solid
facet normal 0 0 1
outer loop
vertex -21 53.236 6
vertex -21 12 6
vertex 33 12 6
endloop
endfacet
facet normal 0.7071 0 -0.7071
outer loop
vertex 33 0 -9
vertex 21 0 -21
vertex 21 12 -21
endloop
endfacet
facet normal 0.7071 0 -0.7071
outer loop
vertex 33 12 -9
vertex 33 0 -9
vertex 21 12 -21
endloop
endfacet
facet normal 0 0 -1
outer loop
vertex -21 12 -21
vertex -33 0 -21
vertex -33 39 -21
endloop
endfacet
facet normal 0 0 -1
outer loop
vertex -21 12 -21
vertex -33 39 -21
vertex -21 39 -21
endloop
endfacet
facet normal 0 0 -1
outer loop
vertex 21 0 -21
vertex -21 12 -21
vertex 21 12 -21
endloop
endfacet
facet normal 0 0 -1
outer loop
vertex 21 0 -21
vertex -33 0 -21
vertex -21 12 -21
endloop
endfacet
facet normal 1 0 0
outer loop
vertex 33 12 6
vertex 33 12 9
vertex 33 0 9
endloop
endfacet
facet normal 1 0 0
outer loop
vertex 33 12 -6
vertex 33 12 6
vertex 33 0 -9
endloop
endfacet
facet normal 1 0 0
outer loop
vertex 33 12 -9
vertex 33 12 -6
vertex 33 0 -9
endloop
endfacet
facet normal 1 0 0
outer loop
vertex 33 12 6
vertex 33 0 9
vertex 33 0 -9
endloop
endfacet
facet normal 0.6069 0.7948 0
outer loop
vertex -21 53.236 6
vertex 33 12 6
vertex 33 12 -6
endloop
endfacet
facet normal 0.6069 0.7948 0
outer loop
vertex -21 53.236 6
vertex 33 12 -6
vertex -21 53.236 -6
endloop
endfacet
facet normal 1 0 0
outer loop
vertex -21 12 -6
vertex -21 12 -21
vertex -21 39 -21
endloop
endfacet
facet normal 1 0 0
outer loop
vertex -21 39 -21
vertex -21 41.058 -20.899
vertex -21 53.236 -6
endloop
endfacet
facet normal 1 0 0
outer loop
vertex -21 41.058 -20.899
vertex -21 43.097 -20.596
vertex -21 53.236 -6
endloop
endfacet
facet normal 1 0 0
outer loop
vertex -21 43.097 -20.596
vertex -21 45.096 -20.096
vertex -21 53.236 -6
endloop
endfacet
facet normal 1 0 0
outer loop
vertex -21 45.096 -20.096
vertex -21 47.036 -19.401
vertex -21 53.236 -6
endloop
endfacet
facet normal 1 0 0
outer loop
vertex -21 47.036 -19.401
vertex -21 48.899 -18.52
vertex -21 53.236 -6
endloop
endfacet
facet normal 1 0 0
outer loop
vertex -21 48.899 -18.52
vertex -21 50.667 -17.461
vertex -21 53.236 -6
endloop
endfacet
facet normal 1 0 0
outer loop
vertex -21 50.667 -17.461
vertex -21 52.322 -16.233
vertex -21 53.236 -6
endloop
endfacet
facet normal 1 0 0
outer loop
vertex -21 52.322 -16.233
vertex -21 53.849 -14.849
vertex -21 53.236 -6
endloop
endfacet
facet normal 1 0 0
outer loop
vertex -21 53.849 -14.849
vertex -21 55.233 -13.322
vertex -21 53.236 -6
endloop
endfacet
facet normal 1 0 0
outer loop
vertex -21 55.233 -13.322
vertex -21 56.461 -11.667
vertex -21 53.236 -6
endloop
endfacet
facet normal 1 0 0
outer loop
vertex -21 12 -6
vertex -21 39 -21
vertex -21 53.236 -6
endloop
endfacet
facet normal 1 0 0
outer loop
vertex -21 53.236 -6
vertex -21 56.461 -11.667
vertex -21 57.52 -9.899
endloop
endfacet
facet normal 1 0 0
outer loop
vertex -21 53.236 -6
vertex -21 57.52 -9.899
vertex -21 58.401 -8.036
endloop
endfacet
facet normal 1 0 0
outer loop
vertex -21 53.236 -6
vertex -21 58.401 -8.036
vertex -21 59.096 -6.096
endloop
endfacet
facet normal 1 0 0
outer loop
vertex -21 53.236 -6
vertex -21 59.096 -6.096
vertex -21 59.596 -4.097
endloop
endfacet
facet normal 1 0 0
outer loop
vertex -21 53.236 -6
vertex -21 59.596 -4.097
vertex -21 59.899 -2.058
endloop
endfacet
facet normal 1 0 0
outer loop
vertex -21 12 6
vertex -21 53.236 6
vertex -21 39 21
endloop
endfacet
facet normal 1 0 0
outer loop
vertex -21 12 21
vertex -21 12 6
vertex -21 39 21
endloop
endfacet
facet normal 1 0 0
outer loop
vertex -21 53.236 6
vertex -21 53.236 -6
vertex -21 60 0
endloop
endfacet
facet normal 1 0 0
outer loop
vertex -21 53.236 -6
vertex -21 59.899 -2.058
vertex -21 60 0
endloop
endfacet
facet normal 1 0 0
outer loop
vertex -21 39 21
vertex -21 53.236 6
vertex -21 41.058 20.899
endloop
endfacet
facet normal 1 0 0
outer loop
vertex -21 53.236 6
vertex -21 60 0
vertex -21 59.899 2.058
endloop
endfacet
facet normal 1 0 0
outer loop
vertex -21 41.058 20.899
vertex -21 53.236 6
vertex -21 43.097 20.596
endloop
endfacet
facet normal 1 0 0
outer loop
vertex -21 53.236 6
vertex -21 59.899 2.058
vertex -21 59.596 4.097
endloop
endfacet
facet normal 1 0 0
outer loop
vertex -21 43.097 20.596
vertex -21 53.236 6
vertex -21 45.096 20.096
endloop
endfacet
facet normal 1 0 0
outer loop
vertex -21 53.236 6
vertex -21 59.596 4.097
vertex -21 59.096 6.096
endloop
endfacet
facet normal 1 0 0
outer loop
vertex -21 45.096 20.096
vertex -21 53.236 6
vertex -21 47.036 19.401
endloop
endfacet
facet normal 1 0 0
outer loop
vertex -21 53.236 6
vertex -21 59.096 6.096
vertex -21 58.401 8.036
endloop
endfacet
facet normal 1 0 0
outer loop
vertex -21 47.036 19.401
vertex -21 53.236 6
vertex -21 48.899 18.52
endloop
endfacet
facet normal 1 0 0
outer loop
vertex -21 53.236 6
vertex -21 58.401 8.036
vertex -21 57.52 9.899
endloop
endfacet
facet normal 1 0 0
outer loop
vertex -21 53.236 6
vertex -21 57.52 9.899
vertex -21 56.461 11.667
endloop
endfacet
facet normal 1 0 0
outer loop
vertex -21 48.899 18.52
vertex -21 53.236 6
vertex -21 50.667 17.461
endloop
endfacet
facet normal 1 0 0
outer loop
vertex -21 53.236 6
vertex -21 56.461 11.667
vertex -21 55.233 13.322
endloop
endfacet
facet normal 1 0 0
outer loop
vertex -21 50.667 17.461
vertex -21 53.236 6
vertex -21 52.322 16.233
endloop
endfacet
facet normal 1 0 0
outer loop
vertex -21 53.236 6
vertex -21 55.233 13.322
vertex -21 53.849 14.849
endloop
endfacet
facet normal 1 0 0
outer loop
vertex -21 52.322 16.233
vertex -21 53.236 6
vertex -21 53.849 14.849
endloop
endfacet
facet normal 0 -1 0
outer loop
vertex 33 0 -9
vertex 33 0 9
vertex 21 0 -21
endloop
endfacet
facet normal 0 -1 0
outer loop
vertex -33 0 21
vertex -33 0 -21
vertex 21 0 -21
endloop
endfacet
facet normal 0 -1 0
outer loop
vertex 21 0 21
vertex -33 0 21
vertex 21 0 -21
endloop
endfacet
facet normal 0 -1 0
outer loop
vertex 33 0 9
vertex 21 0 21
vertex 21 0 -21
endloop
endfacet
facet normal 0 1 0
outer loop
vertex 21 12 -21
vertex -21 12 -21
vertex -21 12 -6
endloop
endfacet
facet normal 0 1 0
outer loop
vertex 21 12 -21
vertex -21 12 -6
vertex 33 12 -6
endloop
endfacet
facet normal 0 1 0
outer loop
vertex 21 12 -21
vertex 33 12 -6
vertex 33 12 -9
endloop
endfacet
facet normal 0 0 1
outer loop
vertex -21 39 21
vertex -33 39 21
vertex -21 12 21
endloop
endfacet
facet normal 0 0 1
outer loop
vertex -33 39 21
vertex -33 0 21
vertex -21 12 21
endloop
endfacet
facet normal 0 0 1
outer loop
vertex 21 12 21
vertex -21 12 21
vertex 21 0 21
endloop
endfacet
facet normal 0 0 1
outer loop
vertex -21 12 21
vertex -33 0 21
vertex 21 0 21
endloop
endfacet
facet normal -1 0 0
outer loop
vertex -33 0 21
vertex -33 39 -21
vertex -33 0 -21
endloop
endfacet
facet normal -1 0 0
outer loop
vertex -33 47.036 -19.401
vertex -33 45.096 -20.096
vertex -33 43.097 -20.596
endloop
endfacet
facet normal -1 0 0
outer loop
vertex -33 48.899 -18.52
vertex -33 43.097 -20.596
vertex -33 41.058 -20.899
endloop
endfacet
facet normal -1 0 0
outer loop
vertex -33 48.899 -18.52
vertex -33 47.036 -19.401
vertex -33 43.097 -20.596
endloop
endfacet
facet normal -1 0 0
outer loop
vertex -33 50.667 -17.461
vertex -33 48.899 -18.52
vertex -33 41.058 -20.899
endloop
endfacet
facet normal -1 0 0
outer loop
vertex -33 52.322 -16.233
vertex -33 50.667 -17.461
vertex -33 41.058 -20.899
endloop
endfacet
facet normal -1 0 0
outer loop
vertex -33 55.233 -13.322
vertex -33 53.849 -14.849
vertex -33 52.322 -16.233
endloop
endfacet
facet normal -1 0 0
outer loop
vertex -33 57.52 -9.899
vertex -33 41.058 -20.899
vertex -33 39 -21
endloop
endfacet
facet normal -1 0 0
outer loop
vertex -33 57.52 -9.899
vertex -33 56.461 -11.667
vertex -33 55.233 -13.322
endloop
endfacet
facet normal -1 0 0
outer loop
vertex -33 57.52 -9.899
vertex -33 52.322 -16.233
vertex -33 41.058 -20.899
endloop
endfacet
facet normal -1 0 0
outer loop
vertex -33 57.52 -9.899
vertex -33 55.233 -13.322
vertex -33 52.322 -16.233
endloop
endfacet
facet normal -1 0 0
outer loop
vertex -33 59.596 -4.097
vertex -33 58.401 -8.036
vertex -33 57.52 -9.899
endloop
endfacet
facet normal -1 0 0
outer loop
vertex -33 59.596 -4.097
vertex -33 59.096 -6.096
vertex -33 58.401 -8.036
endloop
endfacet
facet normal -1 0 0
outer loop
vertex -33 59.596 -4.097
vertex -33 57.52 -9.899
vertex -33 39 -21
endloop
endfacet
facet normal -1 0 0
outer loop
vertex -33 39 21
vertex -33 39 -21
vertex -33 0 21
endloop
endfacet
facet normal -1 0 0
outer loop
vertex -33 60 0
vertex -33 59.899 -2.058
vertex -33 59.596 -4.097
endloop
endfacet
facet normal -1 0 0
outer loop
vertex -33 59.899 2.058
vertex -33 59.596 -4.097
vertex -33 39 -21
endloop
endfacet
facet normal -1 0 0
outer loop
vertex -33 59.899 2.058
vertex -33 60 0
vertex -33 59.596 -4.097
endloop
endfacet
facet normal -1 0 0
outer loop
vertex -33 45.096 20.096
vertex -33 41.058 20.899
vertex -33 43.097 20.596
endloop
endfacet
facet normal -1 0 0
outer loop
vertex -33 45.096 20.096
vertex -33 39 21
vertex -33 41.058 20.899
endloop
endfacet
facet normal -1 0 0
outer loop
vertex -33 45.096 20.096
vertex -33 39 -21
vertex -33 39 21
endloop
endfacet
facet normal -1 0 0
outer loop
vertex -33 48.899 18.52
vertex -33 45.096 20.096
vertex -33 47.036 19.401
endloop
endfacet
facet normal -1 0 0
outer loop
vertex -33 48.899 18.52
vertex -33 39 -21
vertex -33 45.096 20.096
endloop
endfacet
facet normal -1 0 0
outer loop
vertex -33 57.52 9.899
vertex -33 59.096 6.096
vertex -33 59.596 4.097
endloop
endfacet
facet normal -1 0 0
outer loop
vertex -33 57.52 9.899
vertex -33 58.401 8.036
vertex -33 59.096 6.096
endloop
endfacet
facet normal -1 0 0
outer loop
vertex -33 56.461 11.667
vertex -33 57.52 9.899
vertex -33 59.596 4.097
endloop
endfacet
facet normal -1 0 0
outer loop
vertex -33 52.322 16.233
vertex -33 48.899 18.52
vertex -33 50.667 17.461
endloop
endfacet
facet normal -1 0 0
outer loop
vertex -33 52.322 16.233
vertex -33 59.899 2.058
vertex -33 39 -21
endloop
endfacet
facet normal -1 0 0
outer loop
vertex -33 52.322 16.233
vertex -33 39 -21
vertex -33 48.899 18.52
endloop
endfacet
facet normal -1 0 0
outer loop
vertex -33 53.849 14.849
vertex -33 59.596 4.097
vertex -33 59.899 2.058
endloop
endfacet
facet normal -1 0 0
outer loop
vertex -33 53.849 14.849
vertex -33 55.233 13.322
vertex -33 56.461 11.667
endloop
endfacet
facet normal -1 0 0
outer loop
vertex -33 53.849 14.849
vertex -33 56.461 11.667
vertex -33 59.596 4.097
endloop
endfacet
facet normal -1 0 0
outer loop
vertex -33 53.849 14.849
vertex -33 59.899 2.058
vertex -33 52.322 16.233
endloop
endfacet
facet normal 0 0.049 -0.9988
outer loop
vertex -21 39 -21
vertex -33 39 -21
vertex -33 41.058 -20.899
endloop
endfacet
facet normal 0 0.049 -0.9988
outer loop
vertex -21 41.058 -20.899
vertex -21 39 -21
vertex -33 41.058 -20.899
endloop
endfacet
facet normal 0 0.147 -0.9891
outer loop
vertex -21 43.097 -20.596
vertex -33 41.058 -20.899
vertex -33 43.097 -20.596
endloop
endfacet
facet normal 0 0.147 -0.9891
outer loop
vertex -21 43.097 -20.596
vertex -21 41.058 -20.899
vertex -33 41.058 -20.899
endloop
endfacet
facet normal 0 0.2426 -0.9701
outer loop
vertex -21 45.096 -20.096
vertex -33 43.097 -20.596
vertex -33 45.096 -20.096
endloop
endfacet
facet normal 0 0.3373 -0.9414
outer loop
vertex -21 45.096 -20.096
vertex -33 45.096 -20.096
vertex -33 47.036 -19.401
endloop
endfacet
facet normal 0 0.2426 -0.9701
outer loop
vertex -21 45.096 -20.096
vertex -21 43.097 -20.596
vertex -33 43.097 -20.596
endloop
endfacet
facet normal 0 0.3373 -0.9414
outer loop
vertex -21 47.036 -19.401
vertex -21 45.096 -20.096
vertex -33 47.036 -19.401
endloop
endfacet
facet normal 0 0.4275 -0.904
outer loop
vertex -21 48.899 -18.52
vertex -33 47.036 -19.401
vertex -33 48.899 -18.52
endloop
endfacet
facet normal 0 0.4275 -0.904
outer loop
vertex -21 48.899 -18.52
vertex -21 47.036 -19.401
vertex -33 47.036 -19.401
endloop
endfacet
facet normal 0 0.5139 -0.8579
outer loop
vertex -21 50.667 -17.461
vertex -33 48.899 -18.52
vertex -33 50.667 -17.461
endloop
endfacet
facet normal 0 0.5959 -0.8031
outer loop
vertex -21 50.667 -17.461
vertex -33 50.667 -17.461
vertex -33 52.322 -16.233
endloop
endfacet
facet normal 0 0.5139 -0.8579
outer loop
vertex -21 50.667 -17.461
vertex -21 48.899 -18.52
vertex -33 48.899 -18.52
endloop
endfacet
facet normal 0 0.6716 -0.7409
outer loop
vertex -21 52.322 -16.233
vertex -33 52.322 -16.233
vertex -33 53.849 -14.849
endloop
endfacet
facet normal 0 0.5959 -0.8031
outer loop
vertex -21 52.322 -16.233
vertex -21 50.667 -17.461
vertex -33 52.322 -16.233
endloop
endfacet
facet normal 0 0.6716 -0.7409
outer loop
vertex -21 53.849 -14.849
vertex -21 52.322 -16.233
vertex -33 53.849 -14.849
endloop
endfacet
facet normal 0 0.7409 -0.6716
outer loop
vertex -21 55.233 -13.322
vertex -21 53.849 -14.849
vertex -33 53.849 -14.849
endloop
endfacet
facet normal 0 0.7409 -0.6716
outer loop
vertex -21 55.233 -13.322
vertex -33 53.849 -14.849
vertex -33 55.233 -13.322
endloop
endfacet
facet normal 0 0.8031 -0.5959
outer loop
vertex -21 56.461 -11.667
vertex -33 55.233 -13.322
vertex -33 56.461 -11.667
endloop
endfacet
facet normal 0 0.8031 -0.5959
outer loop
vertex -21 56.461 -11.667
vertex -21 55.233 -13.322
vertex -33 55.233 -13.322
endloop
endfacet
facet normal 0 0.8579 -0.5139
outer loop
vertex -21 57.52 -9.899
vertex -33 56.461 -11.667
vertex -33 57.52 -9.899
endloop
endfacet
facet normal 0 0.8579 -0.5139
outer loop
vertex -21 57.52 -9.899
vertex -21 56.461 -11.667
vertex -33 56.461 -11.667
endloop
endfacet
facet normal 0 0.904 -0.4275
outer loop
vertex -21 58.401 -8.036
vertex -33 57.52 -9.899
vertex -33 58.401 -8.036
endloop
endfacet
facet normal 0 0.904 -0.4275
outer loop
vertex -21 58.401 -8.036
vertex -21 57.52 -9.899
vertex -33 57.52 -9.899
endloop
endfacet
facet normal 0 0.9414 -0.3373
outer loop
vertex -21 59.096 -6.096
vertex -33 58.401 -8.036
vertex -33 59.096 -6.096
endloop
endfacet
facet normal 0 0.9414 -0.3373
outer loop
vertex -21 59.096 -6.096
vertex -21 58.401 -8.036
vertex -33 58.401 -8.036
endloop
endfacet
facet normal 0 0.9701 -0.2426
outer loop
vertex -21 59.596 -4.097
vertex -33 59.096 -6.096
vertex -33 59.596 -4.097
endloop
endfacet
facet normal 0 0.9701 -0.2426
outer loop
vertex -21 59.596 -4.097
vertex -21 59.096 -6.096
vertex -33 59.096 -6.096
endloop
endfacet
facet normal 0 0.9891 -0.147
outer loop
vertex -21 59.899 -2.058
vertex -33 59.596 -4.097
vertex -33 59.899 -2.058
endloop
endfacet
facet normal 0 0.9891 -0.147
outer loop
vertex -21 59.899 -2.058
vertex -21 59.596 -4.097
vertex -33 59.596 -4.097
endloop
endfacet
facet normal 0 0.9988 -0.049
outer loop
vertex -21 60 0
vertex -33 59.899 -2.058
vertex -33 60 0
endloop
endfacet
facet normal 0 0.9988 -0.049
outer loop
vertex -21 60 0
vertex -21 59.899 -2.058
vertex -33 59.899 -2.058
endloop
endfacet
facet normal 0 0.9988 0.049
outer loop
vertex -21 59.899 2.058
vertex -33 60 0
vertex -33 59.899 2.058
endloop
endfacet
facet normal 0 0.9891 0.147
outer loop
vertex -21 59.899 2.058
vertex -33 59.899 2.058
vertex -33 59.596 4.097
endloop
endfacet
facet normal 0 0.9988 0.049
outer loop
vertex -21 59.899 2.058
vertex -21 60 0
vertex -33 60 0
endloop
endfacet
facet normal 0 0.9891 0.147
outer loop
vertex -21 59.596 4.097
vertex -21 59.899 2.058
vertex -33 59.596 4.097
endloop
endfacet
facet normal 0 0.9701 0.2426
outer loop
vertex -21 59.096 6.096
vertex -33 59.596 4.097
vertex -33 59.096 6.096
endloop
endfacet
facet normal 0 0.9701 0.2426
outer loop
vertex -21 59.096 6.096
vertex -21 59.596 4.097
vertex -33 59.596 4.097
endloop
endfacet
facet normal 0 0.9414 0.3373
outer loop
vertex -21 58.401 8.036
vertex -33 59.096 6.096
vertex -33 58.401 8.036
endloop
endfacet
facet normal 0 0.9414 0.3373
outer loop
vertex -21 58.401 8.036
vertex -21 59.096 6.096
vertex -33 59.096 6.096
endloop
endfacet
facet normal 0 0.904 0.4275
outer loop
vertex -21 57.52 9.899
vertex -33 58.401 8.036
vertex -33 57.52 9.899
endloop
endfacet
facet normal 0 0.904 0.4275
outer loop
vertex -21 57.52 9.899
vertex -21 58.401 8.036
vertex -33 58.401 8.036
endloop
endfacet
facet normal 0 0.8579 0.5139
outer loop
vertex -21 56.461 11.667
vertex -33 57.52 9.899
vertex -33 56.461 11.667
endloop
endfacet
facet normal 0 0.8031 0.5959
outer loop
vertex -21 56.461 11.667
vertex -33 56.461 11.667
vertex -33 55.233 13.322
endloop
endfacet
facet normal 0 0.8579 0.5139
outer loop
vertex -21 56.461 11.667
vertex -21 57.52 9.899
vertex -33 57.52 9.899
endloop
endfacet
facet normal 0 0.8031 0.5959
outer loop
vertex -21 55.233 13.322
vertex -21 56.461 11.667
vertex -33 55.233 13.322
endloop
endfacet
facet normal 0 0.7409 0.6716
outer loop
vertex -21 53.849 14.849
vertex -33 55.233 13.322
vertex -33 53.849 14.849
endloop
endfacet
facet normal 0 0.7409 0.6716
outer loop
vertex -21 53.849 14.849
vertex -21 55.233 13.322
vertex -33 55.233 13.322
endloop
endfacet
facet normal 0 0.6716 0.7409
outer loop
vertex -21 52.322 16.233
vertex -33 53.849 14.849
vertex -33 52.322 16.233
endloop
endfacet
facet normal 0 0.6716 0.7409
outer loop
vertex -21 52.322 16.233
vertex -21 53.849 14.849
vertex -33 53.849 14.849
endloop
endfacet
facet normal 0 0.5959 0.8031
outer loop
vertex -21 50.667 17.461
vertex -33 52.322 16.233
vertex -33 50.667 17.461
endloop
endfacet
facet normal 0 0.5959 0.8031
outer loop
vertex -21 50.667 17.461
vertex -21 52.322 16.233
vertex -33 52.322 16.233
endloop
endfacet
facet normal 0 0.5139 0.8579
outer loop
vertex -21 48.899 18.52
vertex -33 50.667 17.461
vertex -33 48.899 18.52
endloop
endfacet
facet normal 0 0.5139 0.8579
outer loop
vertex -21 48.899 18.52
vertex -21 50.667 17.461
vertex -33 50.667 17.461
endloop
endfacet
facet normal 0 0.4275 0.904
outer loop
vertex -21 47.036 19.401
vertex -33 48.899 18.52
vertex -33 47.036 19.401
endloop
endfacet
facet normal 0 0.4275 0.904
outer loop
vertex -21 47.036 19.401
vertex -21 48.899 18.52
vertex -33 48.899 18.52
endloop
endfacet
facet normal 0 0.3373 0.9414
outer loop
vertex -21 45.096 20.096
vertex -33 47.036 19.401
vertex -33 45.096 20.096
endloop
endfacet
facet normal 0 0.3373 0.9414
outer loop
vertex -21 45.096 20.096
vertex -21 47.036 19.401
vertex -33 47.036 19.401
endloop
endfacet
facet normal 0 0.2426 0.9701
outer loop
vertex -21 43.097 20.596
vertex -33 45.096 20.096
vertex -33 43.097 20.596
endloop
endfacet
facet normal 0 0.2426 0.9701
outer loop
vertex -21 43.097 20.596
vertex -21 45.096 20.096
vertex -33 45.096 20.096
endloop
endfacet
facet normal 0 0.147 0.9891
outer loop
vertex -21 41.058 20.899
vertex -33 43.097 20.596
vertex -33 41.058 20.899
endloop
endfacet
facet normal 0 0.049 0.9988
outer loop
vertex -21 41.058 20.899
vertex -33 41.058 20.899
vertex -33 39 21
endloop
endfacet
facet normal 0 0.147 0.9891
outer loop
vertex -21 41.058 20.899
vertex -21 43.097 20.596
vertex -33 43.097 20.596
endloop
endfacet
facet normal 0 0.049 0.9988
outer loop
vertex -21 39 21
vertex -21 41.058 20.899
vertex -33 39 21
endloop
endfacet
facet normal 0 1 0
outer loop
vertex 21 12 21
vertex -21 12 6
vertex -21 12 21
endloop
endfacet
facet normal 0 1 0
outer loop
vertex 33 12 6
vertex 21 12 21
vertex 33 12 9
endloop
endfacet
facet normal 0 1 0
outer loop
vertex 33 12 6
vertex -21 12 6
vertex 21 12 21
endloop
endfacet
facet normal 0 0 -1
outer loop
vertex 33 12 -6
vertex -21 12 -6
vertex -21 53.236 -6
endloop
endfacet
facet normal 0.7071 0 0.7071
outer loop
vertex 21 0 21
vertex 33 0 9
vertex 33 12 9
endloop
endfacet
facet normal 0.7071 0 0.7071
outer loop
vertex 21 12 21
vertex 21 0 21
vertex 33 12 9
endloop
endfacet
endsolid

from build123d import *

# Parameters (mm, degrees)
SKETCH1_W           = 66
SKETCH1_H           = 42
BOSS_EXTRUDE1_DEPTH = 12
CHAMFER1_SIZE       = 12
CHAMFER2_SIZE       = 12
SKETCH2_W           = 54
SKETCH2_H           = 12
BOSS_EXTRUDE2_DEPTH = 42
CHAMFER3_SIZE       = 42
CHAMFER3_SIZE_2     = 55
SKETCH4_W           = 12
SKETCH4_H           = 42
BOSS_EXTRUDE3_DEPTH = 27
SKETCH7_W           = 12
SKETCH7_H           = 21
REVOLVE1_ANGLE      = 181


with BuildPart() as part:
    # Sketch1 → Boss-Extrude1 (new body)
    with BuildSketch(Plane(origin=(0, 0, 0), x_dir=(1, 0, 0), z_dir=(0, 1, 0))):
        Rectangle(SKETCH1_W, SKETCH1_H)
    extrude(amount=BOSS_EXTRUDE1_DEPTH)

    # Chamfer1
    chamfer1_edges = [part.edges().sort_by_distance(p)[0] for p in [
        (33, 6, 21),
    ]]
    chamfer(chamfer1_edges, length=CHAMFER1_SIZE)

    # Chamfer2
    chamfer2_edges = [part.edges().sort_by_distance(p)[0] for p in [
        (33, 6, -21),
    ]]
    chamfer(chamfer2_edges, length=CHAMFER2_SIZE)

    # Sketch2 → Boss-Extrude2 (add)
    with BuildSketch(Plane(origin=(0, 12, 0), x_dir=(1, 0, 0), z_dir=(0, 1, 0))):
        with Locations((6, 0)):
            Rectangle(SKETCH2_W, SKETCH2_H)
    extrude(amount=BOSS_EXTRUDE2_DEPTH)

    # Chamfer3
    # the kernel refuses this chamfer: 55, 42 mm, written as the material it takes off along each edge
    with BuildSketch(Plane(origin=(33, 54, 147.910486993), x_dir=(0.04031520079207804, -0.9991870118176548, 0), z_dir=(0, 0, -1))) as chamfer3_piece_1:
        Polygon((CHAMFER3_SIZE * 0.999187011818, CHAMFER3_SIZE * 0.0403152007921), (-CHAMFER3_SIZE_2 * 0.0403152007921, CHAMFER3_SIZE_2 * 0.999187011818), (0, 0), align=None)
    extrude(amount=295.820973986, mode=Mode.SUBTRACT)

    # Sketch4 → Boss-Extrude3 (add)
    with BuildSketch(Plane(origin=(0, 12, 0), x_dir=(1, 0, 0), z_dir=(0, 1, 0))):
        with Locations((-27, 0)):
            Rectangle(SKETCH4_W, SKETCH4_H)
    extrude(amount=BOSS_EXTRUDE3_DEPTH)

    # Sketch7 → Revolve1 (revolve)
    with BuildSketch(Plane(origin=(0, 39, 0), x_dir=(1, 0, 0), z_dir=(0, 1, 0))):
        with Locations((-27, 10.5)):
            Rectangle(SKETCH7_W, SKETCH7_H)
    revolve(axis=Axis((0, 39, 0), (1, 0, 0)), revolution_arc=REVOLVE1_ANGLE)


solid = part.part
